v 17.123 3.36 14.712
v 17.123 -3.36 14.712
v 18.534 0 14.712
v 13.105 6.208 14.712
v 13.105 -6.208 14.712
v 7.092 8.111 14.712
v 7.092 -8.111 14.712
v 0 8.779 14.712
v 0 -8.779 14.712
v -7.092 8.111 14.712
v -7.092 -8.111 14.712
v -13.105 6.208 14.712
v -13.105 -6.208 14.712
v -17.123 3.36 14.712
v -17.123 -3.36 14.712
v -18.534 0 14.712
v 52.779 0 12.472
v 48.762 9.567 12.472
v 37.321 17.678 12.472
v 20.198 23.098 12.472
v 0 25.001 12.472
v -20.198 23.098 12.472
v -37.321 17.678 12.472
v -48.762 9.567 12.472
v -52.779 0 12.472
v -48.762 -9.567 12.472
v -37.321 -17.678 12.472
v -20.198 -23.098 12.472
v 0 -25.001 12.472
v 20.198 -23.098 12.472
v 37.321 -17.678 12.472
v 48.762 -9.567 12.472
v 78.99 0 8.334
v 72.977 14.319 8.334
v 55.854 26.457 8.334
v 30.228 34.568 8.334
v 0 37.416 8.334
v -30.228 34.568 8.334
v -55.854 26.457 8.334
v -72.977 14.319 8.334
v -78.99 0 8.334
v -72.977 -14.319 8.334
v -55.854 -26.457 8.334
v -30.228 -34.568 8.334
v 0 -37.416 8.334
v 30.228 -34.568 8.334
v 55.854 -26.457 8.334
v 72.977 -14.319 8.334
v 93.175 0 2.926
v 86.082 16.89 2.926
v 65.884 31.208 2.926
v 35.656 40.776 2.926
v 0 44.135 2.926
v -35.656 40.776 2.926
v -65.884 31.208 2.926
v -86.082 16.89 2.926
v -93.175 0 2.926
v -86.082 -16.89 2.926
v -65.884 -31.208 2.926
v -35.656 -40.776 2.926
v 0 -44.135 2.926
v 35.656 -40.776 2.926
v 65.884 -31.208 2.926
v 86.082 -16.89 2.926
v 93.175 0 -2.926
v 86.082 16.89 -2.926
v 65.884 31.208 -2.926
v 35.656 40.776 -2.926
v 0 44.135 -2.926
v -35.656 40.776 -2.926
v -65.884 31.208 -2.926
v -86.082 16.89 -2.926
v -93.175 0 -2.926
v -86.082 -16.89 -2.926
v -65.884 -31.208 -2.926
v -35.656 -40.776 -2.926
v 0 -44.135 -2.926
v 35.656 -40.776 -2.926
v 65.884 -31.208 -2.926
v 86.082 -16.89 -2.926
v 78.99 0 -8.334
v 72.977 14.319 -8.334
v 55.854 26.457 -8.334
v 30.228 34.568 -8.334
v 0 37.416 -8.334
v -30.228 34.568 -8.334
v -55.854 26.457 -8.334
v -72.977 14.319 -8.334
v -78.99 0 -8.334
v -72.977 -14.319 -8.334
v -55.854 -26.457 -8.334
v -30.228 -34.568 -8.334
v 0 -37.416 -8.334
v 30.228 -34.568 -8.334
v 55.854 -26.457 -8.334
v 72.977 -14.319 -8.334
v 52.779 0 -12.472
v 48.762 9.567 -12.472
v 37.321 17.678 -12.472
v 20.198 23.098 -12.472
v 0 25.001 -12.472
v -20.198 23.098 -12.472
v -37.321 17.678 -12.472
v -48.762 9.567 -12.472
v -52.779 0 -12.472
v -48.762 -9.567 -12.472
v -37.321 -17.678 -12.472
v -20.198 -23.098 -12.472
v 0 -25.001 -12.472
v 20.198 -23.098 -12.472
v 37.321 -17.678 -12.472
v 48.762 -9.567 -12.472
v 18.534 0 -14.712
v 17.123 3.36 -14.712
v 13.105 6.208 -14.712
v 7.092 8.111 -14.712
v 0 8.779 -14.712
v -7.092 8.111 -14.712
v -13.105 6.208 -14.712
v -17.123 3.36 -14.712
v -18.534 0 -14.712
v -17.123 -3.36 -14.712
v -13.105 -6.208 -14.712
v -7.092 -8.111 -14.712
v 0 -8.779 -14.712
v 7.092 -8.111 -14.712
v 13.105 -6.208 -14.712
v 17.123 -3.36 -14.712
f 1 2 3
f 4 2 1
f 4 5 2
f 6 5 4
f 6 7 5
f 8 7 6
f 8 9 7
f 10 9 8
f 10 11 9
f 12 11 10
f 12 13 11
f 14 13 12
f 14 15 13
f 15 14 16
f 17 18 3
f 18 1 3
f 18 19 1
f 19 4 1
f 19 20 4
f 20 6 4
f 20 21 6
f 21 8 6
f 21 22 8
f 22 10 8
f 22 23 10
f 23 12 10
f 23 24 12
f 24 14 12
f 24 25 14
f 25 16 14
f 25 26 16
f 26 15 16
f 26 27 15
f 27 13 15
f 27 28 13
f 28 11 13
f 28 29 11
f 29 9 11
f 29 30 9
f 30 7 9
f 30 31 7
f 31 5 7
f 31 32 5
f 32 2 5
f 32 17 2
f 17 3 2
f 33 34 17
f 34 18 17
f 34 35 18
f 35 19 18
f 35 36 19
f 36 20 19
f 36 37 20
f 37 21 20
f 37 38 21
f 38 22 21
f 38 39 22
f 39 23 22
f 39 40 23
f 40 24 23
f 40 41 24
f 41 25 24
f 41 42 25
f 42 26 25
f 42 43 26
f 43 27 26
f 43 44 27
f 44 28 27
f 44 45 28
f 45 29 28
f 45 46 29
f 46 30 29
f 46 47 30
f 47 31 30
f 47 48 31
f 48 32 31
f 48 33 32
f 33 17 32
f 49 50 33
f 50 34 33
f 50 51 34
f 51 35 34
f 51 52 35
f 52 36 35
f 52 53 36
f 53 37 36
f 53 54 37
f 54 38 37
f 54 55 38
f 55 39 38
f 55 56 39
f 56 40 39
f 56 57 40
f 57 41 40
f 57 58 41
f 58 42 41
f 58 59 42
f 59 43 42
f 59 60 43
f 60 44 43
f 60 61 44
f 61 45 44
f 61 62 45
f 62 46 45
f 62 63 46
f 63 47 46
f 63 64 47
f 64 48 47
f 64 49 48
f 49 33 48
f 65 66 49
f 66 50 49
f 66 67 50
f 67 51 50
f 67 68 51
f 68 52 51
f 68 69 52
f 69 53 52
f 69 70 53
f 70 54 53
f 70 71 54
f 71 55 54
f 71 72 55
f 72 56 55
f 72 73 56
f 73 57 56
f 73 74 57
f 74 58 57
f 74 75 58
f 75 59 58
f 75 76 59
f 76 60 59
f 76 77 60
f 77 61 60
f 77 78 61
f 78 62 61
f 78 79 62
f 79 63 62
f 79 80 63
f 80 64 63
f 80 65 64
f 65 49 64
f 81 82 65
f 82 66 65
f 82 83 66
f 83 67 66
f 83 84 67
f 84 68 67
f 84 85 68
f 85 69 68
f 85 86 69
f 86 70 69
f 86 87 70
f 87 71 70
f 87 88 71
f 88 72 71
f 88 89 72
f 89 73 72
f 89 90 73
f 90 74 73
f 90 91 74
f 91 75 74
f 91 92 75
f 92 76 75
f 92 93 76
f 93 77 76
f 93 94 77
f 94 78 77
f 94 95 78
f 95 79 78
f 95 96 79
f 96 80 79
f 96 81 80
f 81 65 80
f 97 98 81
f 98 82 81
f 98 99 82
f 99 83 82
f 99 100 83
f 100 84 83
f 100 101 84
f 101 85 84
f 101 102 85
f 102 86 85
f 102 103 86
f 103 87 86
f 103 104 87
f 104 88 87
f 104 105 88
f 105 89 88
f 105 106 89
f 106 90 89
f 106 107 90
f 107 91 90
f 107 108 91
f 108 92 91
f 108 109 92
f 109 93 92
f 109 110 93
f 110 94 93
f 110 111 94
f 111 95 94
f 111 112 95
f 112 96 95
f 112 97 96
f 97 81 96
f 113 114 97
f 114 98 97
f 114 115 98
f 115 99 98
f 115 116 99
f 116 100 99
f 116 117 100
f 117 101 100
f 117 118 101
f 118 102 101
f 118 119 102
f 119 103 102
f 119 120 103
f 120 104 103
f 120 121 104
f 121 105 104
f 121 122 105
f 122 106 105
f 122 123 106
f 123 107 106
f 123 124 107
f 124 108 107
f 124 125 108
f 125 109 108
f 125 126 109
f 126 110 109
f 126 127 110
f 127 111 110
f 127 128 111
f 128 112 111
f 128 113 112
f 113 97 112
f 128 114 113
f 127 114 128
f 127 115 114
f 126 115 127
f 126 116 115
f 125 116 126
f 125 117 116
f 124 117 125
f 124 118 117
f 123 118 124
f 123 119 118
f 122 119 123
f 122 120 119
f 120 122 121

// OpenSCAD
// Generated by SolidPython 1.0.1 on 2020-07-29 00:46:53


scale(v = [19, 9, 3]) {
	sphere(r = 5);
}
/***********************************************
*********      SolidPython code:      **********
************************************************
 
# import packages: SolidPython
from solid import *
from solid.utils import *
from itertools import chain, combinations, permutations


class Resize:

    def __init__(self, scad_file):
        self.scad_file = scad_file
        #self.scad_file = import_scad(scad_file)
        # cone/cylinder param:
        self.r1 = 0
        self.r2 = 0
        self.h = 0
        # rectangular prism param:
        self.w = 0
        self.l = 0
        # ellipse param:
        self.r = 0

    # import OpenScad code (file name corresponds to shape)


    # classify shape + parameters
    def assign(self, param1, param2, param3):
        if self.scad_file == 'cone.scad':
            self.r1 = param1
            self.r2 = param2
            self.h = param3
        elif self.scad_file == 'cylinder.scad':
            self.r1 = param1
            self.r2 = param2
            self.h = param3
        elif self.scad_file == 'rectangularPrism.scad':
            self.h = param1
            self.l = param2
            self.w = param3
        else:
            self.r = param1
            self.h = param2

    # resize parameters
    def iterate(self):
        x = range(3, 20, 2)
        i = 1
        if self.scad_file == 'cone.scad':
            tempList = list(permutations(x, 2))
            for temp in tempList:
                param1 = temp[0]
                param2 = temp[1]
                filepath = 'produced_scad_files/' + 'cone' + str(param1) + '_' + str(param2) + '_' + '.scad'
                scad_render_to_file(cylinder(h=param1, r1=param2, r2=0), filepath)

        elif self.scad_file == 'cylinder.scad':
            tempList = list(permutations(x, 3))
            for temp in tempList:
                param1 = temp[0]
                param2 = temp[1]
                filepath = 'produced_scad_files/' + 'cylinder' + str(param1) + '_' + str(param2) + '_' + '.scad'
                scad_render_to_file(cylinder(h=param1, r1=param2, r2=param2), filepath)

        elif self.scad_file == 'rectangularPrism.scad':
            tempList = list(permutations(x, 3))
            for temp in tempList:
                param1 = temp[0]
                param2 = temp[1]
                param3 = temp[2]
                filepath = 'produced_scad_files/' + 'rectangularPrism' + str(param1) + '_' + str(param2) + '_' + str(
                    param3) + '.scad'
                scad_render_to_file(cube(size=(param1, param2, param3)), filepath)

        elif self.scad_file == 'ellipse.scad':
            tempList = list(permutations(x, 4))
            for temp in tempList:
                param1 = temp[0]
                param2 = temp[1]
                param3 = temp[2]
                param4 = temp[3]
                filepath = 'produced_scad_files/' + 'ellipse' + str(param1) + '_' + str(param2) + '_' + str(param3) + '_' + str(param4) + '.scad'
                scad_render_to_file(scale([param1, param2, param3])(sphere(r=param4)), filepath)

    def render_to_scadfile(self):
        scad_render_to_file(scad, 'example.scad') 
 
************************************************/
